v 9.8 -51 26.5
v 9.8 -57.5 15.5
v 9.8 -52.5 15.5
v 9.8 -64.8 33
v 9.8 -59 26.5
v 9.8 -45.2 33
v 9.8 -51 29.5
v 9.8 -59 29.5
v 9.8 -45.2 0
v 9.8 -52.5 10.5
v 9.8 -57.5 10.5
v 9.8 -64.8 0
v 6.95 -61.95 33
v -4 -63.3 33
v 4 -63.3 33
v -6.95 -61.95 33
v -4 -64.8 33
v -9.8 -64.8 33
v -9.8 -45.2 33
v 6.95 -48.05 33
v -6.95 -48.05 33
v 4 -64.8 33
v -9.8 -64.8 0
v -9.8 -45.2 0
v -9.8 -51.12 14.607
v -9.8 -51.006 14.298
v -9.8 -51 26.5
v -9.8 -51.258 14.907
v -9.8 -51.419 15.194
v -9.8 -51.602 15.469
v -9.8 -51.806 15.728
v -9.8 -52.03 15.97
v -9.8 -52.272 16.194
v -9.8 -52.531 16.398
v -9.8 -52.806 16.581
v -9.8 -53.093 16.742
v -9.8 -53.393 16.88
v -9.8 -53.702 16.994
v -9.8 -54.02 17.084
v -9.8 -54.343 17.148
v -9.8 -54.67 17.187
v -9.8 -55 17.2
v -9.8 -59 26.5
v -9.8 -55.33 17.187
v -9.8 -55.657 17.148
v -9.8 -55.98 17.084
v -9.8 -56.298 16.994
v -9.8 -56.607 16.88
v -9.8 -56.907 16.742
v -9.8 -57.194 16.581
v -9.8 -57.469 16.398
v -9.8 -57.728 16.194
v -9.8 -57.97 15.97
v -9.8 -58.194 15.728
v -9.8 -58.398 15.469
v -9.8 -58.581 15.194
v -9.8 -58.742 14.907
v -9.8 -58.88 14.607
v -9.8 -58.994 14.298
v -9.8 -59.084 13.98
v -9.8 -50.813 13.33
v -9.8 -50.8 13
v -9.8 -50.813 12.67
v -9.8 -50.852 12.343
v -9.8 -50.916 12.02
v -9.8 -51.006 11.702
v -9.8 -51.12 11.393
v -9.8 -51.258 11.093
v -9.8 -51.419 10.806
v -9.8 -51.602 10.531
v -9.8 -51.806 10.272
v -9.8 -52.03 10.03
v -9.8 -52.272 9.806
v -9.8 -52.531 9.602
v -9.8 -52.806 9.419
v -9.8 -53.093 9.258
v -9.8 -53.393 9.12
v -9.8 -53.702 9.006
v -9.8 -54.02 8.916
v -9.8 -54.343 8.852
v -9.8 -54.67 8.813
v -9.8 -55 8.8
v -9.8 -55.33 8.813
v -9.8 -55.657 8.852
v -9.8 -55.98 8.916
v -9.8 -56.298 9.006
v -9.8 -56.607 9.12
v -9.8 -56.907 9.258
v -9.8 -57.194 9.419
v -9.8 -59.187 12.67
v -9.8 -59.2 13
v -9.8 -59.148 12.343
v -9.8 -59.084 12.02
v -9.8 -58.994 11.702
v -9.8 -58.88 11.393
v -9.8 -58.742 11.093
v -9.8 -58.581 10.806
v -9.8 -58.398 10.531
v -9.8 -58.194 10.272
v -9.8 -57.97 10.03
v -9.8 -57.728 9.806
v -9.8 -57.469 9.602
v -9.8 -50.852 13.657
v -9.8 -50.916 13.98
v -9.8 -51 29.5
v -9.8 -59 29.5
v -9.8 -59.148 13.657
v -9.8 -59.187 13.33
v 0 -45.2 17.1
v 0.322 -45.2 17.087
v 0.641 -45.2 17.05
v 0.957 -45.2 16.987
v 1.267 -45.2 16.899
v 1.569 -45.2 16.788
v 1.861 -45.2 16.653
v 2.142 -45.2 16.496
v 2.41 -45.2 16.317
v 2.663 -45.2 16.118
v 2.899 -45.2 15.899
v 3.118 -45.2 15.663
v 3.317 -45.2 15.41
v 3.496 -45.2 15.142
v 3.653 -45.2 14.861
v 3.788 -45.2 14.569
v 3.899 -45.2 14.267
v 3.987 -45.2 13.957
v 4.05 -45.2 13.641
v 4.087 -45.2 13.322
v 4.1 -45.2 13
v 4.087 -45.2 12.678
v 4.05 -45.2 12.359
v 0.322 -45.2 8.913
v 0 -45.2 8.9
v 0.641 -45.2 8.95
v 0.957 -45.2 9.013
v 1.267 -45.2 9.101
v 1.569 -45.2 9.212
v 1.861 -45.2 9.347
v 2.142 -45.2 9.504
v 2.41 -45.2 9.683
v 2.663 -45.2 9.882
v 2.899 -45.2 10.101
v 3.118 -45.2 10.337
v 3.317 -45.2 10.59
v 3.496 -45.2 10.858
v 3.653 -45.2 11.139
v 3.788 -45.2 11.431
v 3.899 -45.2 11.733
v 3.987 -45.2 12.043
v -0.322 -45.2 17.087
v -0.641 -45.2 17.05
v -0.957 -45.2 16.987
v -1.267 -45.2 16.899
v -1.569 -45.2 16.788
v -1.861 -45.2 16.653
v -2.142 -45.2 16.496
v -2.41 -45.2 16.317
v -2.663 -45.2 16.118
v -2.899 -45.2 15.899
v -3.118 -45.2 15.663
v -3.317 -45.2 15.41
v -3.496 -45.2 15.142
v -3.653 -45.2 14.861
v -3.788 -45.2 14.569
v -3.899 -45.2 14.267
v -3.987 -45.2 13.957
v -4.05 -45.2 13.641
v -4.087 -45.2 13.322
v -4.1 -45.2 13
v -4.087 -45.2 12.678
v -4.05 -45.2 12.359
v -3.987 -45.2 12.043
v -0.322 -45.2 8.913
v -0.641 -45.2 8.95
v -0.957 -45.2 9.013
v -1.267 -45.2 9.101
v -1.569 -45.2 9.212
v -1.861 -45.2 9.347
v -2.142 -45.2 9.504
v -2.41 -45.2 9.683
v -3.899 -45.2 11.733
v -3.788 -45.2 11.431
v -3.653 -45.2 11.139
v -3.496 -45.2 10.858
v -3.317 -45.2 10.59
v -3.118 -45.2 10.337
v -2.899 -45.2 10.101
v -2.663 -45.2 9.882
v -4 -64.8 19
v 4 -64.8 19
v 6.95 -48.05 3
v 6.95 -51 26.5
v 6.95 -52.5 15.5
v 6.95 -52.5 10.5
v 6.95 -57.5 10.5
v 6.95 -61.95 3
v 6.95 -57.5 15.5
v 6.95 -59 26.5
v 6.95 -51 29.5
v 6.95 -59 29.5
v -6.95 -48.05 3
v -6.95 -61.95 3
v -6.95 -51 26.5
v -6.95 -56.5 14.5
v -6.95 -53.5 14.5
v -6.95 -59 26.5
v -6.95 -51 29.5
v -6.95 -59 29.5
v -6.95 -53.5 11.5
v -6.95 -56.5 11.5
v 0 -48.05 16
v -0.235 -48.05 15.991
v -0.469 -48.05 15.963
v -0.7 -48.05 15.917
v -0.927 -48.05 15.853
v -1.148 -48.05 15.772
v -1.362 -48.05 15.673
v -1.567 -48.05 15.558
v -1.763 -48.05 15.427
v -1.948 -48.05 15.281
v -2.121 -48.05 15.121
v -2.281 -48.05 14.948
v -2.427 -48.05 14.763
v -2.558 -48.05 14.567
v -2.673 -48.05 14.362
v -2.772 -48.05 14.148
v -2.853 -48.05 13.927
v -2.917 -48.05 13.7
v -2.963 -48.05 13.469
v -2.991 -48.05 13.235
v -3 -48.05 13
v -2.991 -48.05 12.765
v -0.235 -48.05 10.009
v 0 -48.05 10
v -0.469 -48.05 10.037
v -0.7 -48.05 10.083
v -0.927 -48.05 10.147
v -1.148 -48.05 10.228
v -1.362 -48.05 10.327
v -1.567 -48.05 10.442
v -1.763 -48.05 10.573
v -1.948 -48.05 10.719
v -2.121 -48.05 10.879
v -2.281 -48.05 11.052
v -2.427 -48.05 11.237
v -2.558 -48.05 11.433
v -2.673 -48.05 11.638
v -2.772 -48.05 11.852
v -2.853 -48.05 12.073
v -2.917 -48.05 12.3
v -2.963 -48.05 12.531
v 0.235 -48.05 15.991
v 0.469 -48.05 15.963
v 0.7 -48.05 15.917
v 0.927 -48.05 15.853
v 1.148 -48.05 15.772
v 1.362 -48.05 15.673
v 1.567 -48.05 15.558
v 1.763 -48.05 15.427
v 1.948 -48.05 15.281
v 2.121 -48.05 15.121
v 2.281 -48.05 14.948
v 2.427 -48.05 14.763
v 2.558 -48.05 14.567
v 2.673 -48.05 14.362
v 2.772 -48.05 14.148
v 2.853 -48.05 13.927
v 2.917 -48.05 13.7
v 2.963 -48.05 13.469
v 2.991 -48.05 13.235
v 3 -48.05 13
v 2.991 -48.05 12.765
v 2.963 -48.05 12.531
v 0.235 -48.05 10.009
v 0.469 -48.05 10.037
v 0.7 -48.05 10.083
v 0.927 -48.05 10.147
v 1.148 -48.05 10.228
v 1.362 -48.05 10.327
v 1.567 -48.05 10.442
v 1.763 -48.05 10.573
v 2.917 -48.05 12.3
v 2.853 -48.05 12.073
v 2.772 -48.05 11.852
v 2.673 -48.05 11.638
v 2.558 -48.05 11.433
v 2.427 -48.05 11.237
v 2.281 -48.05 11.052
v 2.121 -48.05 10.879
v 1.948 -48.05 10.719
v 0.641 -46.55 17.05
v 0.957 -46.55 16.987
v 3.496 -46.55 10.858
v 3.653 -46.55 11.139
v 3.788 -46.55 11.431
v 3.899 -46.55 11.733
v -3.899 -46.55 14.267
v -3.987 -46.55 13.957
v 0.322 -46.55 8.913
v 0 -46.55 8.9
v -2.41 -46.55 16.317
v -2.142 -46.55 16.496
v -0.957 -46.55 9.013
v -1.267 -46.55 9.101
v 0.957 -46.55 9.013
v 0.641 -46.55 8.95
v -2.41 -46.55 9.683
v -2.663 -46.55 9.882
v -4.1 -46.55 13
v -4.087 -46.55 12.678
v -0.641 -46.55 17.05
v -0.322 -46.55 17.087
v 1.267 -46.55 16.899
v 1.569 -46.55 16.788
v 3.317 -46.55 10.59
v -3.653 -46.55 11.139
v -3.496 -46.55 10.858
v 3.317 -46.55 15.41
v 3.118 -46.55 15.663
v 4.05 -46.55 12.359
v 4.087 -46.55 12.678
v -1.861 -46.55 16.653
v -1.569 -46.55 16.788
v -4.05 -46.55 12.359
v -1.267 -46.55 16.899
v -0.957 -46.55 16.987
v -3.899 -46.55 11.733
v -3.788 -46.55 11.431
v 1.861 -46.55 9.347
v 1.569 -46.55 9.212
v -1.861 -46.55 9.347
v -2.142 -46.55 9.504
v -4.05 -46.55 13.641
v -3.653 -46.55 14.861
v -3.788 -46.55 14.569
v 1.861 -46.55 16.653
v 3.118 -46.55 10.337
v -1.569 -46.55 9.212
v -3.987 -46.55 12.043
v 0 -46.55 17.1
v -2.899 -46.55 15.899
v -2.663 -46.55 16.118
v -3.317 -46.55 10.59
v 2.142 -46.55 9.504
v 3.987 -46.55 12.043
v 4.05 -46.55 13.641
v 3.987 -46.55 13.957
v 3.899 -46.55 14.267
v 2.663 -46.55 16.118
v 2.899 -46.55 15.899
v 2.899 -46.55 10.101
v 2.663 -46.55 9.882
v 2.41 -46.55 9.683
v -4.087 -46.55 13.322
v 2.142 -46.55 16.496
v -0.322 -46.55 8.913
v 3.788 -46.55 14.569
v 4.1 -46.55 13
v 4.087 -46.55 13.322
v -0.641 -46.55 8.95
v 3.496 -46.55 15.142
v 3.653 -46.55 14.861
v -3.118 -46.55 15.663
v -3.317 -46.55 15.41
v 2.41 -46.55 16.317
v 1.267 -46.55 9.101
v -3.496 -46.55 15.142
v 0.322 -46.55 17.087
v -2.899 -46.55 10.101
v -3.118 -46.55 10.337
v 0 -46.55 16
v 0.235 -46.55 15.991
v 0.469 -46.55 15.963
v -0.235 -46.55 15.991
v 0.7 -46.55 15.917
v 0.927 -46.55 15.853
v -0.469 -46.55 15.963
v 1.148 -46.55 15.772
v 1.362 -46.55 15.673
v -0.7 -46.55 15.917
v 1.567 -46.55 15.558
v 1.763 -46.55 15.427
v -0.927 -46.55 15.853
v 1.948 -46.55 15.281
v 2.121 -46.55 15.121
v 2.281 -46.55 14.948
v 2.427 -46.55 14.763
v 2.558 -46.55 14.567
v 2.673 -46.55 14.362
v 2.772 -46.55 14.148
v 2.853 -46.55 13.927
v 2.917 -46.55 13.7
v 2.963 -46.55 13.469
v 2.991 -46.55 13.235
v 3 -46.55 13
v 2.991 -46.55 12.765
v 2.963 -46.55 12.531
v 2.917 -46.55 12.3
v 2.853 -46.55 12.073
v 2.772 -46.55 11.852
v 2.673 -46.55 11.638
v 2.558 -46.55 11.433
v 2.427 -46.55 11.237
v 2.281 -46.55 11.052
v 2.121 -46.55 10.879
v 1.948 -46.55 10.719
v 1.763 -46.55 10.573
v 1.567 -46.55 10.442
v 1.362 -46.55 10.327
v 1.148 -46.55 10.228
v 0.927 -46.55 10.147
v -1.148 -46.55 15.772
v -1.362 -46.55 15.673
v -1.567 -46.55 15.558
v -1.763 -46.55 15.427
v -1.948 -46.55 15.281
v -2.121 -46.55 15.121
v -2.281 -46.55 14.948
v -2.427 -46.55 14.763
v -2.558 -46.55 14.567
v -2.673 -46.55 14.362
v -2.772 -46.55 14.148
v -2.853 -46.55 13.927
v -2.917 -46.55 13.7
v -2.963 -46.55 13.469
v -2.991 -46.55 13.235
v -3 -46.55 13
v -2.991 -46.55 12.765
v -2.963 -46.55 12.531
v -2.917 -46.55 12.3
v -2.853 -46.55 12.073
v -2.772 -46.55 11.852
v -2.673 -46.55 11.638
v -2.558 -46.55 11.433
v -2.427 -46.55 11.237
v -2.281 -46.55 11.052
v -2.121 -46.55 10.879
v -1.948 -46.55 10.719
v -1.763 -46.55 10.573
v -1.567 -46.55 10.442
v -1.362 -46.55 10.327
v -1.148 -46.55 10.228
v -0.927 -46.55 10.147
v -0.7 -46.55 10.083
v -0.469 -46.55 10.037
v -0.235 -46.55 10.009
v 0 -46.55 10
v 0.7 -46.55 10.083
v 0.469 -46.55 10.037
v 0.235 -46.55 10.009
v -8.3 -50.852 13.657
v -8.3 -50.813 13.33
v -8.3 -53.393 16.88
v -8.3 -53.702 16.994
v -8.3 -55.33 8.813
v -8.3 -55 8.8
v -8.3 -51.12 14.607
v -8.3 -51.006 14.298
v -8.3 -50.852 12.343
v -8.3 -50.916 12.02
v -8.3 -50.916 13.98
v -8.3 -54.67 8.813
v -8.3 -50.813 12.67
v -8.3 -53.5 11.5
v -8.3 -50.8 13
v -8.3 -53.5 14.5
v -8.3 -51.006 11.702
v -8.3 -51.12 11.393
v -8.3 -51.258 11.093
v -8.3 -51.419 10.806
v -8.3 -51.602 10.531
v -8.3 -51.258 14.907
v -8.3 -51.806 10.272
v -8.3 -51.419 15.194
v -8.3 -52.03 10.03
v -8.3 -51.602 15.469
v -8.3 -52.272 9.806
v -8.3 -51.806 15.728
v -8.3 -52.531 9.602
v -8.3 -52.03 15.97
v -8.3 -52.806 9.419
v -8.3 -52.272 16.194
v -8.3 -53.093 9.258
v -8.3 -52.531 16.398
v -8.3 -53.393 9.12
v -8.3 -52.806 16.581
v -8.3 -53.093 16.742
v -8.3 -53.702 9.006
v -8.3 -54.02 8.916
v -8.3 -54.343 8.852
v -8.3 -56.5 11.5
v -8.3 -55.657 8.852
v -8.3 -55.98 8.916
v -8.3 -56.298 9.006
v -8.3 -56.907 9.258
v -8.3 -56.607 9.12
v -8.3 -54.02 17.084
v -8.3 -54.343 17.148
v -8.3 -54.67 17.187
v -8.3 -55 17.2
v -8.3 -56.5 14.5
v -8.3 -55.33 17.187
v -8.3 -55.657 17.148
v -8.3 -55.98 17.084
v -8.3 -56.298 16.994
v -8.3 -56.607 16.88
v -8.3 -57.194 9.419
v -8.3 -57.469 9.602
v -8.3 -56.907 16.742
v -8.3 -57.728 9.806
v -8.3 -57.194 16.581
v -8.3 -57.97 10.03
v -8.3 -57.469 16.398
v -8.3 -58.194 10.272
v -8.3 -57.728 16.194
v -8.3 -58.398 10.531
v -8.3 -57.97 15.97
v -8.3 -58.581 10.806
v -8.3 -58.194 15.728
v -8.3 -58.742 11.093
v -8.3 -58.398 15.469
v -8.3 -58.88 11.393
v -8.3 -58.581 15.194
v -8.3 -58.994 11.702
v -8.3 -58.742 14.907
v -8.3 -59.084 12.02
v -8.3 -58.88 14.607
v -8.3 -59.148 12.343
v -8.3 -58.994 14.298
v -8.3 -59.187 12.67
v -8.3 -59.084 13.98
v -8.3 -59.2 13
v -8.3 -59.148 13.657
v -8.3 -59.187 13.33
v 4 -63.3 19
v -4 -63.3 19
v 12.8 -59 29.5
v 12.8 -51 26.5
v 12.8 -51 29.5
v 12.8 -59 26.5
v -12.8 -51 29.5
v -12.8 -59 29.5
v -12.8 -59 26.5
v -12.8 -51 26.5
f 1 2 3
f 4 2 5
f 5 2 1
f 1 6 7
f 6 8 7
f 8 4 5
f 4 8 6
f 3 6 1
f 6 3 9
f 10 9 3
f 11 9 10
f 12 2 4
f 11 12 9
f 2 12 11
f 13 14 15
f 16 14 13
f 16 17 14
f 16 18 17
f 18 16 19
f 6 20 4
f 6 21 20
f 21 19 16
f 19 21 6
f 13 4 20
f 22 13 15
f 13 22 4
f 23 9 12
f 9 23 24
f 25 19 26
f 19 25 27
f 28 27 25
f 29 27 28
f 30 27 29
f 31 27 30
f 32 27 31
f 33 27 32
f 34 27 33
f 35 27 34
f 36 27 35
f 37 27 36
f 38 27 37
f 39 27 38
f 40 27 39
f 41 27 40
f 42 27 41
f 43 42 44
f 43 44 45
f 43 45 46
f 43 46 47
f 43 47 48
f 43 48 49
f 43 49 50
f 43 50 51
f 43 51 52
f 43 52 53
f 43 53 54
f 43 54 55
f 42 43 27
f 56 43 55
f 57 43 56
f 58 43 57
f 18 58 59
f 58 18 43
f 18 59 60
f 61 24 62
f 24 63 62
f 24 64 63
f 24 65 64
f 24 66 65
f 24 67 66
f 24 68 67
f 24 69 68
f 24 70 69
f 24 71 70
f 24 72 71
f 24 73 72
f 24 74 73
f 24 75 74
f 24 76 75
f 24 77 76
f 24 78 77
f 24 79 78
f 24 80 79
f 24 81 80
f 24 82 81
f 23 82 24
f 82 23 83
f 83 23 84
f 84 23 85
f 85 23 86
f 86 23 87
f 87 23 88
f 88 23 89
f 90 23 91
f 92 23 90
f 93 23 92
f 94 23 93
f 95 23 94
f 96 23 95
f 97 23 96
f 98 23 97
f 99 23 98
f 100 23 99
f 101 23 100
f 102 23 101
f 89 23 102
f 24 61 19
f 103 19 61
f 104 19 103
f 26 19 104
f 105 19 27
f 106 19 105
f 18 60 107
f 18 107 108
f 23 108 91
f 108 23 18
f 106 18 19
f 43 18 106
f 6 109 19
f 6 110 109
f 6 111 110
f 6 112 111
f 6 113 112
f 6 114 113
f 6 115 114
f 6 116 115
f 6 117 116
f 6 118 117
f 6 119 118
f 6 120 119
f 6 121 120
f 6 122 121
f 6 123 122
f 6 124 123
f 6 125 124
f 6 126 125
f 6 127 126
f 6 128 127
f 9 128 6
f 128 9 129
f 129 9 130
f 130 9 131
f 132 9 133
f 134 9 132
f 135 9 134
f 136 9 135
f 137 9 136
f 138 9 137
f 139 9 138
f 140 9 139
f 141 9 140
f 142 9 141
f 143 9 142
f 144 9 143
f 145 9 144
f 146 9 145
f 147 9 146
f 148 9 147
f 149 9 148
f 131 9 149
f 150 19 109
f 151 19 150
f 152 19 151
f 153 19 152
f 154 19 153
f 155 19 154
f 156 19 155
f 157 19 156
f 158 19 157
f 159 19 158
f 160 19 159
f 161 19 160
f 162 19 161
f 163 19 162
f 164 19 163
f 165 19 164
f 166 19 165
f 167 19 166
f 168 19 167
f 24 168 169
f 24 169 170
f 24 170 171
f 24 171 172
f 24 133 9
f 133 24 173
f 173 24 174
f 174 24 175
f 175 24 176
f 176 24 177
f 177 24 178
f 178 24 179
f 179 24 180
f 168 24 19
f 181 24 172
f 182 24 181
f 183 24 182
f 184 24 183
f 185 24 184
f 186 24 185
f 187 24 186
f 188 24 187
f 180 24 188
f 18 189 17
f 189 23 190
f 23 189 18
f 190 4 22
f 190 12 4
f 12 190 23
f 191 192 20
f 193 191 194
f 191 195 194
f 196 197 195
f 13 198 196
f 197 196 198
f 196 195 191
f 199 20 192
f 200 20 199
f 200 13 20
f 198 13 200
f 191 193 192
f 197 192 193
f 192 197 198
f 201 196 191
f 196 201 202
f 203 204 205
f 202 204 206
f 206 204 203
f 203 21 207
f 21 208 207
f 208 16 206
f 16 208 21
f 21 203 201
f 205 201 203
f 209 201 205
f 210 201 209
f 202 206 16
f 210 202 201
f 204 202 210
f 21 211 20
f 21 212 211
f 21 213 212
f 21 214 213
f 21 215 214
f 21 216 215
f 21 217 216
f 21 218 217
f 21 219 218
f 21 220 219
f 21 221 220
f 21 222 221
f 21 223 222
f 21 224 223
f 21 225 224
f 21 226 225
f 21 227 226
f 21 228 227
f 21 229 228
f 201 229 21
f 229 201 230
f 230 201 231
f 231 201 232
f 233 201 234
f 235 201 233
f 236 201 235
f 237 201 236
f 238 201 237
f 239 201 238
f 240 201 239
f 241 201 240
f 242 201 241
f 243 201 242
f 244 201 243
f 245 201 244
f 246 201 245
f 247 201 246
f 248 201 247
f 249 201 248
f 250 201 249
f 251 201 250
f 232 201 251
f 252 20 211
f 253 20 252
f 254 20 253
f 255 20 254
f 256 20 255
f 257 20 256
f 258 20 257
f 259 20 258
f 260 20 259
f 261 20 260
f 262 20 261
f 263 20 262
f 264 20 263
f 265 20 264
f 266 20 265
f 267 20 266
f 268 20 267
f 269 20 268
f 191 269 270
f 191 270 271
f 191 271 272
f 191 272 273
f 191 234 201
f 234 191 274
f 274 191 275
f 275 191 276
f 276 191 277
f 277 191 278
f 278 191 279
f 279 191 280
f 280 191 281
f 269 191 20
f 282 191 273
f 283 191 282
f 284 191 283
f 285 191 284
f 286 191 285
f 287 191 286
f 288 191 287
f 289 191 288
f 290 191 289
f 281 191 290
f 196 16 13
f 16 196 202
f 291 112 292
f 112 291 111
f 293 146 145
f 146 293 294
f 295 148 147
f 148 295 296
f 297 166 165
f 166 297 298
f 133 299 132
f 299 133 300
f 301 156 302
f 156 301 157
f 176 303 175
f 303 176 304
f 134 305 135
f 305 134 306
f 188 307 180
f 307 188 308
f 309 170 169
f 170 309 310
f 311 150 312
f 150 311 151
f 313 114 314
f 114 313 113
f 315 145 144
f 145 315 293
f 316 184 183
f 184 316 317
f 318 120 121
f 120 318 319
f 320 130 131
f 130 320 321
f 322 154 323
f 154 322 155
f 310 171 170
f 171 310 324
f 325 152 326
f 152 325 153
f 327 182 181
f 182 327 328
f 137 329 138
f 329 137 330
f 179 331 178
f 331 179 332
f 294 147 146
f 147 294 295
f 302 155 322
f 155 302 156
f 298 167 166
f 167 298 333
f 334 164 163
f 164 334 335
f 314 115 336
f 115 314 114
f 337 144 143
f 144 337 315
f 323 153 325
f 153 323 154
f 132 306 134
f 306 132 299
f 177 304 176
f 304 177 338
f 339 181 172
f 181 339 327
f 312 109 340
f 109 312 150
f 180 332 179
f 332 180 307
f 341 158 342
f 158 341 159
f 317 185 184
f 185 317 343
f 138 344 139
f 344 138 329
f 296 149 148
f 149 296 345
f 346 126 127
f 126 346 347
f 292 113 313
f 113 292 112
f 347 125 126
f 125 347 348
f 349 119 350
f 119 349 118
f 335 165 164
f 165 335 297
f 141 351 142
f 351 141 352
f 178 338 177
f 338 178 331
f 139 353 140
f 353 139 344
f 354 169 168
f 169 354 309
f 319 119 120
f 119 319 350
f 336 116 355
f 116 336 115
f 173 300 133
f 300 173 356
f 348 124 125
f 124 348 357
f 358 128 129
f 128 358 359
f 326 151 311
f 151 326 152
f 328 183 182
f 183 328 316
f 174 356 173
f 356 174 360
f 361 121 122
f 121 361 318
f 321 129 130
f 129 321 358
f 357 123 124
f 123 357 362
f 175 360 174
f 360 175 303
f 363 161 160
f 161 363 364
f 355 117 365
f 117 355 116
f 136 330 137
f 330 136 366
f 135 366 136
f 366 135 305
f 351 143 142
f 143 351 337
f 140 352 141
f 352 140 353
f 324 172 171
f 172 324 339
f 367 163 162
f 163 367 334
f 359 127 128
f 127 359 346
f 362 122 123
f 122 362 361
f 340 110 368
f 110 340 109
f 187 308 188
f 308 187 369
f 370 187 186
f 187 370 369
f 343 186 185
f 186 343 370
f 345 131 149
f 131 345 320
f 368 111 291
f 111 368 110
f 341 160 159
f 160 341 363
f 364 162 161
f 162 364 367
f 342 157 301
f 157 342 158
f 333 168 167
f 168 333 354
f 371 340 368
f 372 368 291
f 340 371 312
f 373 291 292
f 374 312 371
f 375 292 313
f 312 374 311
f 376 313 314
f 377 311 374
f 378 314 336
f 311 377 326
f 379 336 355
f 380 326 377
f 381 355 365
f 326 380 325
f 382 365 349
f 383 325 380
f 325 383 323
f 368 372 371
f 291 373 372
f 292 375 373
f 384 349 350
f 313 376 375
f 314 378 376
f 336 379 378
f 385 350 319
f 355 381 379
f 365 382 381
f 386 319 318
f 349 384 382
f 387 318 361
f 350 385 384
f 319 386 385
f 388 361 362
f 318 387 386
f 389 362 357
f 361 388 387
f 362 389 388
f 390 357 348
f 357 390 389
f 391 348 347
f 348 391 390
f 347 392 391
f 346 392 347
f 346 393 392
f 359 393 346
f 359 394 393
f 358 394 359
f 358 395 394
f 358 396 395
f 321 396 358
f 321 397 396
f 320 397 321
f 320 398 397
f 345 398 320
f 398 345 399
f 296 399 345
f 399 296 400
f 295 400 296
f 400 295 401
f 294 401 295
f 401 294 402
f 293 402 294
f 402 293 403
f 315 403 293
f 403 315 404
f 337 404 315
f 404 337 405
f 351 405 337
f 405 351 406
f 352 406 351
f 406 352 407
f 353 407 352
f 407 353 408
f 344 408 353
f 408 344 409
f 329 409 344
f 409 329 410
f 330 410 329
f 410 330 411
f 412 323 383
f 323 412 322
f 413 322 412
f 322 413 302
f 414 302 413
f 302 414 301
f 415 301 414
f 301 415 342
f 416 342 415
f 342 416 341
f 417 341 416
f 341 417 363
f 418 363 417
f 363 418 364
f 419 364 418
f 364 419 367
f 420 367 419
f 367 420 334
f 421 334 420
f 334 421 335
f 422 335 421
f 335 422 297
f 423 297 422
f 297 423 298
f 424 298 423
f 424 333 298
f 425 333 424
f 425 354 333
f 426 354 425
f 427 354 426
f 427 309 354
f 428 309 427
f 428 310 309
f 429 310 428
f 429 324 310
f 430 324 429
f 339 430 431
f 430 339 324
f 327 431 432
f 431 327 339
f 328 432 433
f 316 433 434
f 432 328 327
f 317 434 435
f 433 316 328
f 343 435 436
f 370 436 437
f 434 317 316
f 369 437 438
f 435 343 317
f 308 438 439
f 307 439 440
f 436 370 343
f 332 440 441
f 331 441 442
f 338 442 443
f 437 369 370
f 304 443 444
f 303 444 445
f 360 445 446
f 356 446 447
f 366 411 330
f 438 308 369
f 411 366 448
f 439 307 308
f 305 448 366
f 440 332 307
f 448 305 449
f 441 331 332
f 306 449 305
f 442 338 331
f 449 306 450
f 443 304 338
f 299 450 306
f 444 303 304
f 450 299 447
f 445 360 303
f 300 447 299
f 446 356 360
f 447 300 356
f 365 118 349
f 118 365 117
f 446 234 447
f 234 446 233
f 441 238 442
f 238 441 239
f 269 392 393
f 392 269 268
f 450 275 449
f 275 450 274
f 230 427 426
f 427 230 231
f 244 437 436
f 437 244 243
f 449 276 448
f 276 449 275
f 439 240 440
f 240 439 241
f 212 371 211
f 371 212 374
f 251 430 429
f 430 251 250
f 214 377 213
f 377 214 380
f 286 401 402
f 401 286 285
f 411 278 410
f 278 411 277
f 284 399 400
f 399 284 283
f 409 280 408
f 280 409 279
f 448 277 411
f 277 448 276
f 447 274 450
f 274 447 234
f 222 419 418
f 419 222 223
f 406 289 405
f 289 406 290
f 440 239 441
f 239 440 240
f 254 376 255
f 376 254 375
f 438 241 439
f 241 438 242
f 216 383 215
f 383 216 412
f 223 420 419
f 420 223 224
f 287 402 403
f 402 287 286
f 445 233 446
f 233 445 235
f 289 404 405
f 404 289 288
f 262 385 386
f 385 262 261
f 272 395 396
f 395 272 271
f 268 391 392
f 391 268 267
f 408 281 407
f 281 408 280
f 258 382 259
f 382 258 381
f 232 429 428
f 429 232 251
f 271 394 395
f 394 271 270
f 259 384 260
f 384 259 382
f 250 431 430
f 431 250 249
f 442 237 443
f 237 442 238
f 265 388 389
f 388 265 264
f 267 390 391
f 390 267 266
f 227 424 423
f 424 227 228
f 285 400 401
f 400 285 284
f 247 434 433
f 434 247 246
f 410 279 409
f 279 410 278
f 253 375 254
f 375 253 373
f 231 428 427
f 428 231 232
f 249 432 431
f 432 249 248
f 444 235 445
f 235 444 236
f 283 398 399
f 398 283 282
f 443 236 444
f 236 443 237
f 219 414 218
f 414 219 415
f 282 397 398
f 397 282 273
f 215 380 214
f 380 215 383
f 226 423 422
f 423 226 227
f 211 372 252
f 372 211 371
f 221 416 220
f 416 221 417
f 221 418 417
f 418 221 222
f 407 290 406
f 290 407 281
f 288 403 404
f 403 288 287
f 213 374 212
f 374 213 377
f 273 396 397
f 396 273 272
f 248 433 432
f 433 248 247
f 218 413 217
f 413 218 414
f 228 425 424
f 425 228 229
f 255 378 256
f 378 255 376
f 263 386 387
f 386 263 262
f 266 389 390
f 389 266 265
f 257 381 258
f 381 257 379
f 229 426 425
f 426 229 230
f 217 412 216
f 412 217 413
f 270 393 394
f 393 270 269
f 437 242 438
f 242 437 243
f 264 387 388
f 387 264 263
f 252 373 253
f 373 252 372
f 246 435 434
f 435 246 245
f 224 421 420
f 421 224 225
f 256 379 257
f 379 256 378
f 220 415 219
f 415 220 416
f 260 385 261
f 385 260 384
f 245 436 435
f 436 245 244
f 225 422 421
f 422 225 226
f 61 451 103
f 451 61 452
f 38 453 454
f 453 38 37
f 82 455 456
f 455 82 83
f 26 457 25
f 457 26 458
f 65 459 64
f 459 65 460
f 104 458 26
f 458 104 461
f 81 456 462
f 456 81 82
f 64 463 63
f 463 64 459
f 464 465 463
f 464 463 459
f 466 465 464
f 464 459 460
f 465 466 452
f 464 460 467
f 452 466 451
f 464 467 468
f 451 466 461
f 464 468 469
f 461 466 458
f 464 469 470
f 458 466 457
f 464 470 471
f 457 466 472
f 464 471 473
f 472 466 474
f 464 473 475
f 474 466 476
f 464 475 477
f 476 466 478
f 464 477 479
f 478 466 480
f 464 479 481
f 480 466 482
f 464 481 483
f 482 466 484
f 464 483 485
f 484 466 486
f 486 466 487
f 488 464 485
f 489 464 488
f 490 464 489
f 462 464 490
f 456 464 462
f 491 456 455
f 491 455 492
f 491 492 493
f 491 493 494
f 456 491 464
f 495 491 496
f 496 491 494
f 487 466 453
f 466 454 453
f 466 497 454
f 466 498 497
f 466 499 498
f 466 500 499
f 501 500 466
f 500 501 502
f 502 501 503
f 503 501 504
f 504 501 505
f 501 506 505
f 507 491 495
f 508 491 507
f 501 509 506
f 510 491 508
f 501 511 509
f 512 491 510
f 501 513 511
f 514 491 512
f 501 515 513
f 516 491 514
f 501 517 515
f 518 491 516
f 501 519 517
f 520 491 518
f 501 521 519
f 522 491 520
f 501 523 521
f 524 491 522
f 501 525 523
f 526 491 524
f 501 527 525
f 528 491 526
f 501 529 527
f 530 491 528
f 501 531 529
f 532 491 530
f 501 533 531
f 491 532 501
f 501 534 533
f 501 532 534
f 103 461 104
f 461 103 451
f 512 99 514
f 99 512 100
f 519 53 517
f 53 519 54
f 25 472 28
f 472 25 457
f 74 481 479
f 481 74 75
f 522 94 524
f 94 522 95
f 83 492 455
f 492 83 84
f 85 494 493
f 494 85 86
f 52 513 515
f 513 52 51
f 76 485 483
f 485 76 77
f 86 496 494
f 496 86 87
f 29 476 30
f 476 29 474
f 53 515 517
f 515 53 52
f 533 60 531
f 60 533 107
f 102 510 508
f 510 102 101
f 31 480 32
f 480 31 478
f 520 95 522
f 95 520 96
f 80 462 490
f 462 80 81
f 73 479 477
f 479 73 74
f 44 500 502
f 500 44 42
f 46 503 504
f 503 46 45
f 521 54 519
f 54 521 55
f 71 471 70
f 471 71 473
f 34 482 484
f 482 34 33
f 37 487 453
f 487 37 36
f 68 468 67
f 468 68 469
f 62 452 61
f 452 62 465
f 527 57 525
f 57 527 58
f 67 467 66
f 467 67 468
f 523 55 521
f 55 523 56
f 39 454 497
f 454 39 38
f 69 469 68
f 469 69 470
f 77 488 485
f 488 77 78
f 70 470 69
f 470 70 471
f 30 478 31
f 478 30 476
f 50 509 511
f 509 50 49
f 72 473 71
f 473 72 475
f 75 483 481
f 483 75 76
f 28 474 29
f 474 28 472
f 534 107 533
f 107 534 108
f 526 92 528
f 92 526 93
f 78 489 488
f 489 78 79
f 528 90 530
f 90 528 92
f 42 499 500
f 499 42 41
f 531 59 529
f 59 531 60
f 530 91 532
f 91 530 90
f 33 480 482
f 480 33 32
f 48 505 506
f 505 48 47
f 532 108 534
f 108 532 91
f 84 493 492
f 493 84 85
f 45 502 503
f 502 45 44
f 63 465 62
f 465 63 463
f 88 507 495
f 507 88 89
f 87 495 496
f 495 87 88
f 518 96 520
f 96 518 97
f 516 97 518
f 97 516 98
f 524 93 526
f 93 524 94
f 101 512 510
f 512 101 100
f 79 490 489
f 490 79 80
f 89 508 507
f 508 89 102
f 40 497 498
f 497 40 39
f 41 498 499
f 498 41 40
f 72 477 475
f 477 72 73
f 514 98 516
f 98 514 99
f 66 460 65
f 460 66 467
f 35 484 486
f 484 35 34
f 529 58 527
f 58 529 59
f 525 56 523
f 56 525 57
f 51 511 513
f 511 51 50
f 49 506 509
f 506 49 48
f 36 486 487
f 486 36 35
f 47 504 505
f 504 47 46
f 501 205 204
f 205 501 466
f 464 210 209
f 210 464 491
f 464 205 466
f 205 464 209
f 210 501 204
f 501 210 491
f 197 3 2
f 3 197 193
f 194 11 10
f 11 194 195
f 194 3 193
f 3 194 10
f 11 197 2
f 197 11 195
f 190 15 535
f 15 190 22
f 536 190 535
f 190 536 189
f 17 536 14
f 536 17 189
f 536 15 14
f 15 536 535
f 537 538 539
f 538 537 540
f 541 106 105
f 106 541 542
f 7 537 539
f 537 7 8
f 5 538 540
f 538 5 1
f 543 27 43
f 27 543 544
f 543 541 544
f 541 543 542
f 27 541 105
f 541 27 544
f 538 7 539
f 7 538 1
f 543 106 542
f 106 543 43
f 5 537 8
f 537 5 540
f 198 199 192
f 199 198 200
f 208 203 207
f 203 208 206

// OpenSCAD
// Magnetic OD meter
// Version 5: May 2018, Leon Abelmann
// Differences with version 4 of Hans Keizer
// - Made top lid longer, to accomodate cuvettes with plug
// - Made the insert 0.3 mm bigger to 12.3, so that cuvettes slide in more easily

$vpd=400; //Viewport, defines the zoom factor after auto reload
$fn=80; //High res
//$fn = 20; //Low res for testing

T = 3; //wall thickness in mm
depth_coil=5;

coil_w = 10;
coil_h = 5;
coil_r = 21;
coil_r1 = 22+9-depth_coil;
coil_r2 = 8;
hole_r = 0;
coil_spacing = 23.1;
//coil_spacing = 72;

play = 0.2;
play_cuvette = 0.3;

Wcuv = 13.6; //cuvette width
Hcuv = 30; //cuvette holder height

//translate([-50,0,0]) rotate([180,0,0]) rotate([0,-90,0]) coil_holder();
//translate([0,80,0]) rotate([0,90,-90]) cam_tube_holder();

// Generate entire design
/* translate([0,0.0])     frame(); */
/* translate([50,0,0])    led_holder(); */
/* rotate([0,180,0]) translate([0,0,-coil_spacing]) top_coil()  ; //top coil (with lid hole) */
/* rotate([0,0,0]) translate([0,0,-coil_spacing])  coil(); //bottom coil */
/* rotate([0,90,0]) translate([0,0,-coil_spacing])  coil();  //PD coil */
/* rotate([90,90,0]) translate([0,0,-coil_spacing])  coil();  //camera coil */
/* rotate([-90,-90,0]) translate([0,0,-coil_spacing])  coil(); //non-camera coil */
/* translate([0,0,-10-T]) cuvette_tube(); */
/* translate([0,0,60])    top_lid(); */

// Individual components in one field
//translate ([0,0,36]) frame();
//translate([0,65,15]) rotate([0,90,0]) led_holder();
//translate([45,-50,15]) top_coil();
//translate([-65,-65,15]) coil(); //need 4 of those
//translate([-65,-10,15]) coil();
//translate([-65,45,15]) coil();
//translate([-65,100,15]) coil();
translate([0,-55,0]) cuvette_tube();
//translate ([56,0,0]) rotate([180,0,0]) top_lid(); // need 2 of those
//translate ([56,40,0]) rotate([180,0,0]) top_lid(); // need 2 of those


// frame (center part)
module frame(){
     difference(){
	  union(){
	       frame_len = 72;
	       difference(){
		    coil_frame(frame_len);
		    //cut out cuvette
		    translate([0,0,-10-T]) cuvette_cube();
		    //cut out holes
		    holeD = 0.9;
		    hole_spacing = 23.1;
		    //cut out space for:
		    //bottom coil
		    rotate([0,0,0])
			 translate([0,0,-hole_spacing])
			 coil_holes(coil_w, coil_h, coil_r, hole_r, holeD);
		    //top coil with lid hole
		    rotate([0,180,0])
			 translate([0,0,-hole_spacing])
			 coil_holes(coil_w, coil_h, coil_r, coil_r-2*T, holeD);
		    //PD coil
		    rotate([0,90,0])
			 translate([0,0,-hole_spacing])
			 coil_holes(coil_w, coil_h, coil_r, hole_r, holeD);
		    //LED coil
		    rotate([0,-90,0])
			 translate([0,0,-hole_spacing])
			 coil_holes(coil_w, coil_h, coil_r, coil_r-2*T, holeD);
		    //camera coil
		    rotate([90,90,0])
			 translate([0,0,-hole_spacing])
			 coil_holes(coil_w, coil_h, coil_r, coil_r-2*T, holeD);
		    //non-camera coil
		    rotate([-90,-90,0])
			 translate([0,0,-hole_spacing])
			 coil_holes(coil_w, coil_h, coil_r, hole_r, holeD); 
	       }          
	  }
	  //cut out camera hole
	  translate([-2, 10, 0])
	       cube([1.5*Wcuv, 20, 1.75*Wcuv], center=true);
	  //cut out camera hole other side
	  translate([-2, -10, 0])
	       cube([1.5*Wcuv, 20, 1.75*Wcuv], center=true);
     }
}//End frame

// Coil with led holder
module led_holder(){
     union(){
	  rotate([0,-90,0])
	       translate([0,0,coil_spacing+0.5*coil_r-2*T])
	       coil_spindle(coil_w, coil_h, coil_r, coil_r-2*T); //LED coil
	  //add LED holder
	  LEDtube_L = 30;
	  translate([LEDtube_L/2+frame_len/2-T,0,0])
	       rotate([0,90,0])
	       union(){
	       //create extension tube        
	       cylinder_hollow(LEDtube_L, coil_r-2*T, coil_r-3*T, true);
	       LED_d = 5;
	       difference(){
                    //lid of extension tube
                    translate([0, 0, LEDtube_L/2-T/2])
			 cylinder(h=T, r1=coil_r-2*T, r2=coil_r-2*T, center=true);
                    //hole for LED
                    translate([0, 0, LEDtube_L/2-T/2])
			 cylinder(h=T, d1=LED_d, d2=LED_d, center=true);
	       }
	  }
     }
}//end module ledholder

// Coil on top with opening for lid
module top_coil(){
     coil_spindle(coil_w, coil_h, coil_r, coil_r-2*T);
}

module top_lid(){
     top_lid_height = 15; //Increase to accommodate for cuvette with plug
     union(){
	  translate([0,0,0]) hex_hollow(8, T, coil_r-T, 0);
	  translate([0,0,-top_lid_height/2]) hex_hollow(8, top_lid_height, coil_r-2*T-play/2, coil_r-3*T-play/2);
     }
}

// Coil other coils without special treatment
module coil(){
     coil_spindle(coil_w, coil_h, coil_r, hole_r);
}

// Insert to accomodate diffent types of cuvettes
module cuvette_cube (  ) {
     translate([-Wcuv/2-T-play/2, -Wcuv/2-T-play/2, 0])
	  cube([Wcuv+2*T+play, Wcuv+2*T+play, Hcuv+T], center=false);
     
     //Add 'wings'
     //Wings need to be shorter!
     wing_h = 28;
     wing_l = 4;
     wing_w = 8;
     translate([0,0,wing_h]) 
	  cube([Wcuv+2*T+2*wing_l+play, wing_w+play, 2*T], center=true);   
}

// *************************** subunits *********************************
module coil_holder(){
     difference(){
	  polyN(8, T*2, coil_r-T);
	  holeD = 0.9;
	  translate([0,0,10])
	       coil_holes(coil_w, coil_h, coil_r, hole_r, holeD);
     }
     polyN = 7;
     polyH = 30;
     polyR = 3;
     translate([0,0,polyH/2+T/2])
	  polyNflat(polyN, polyH, polyR);
}

module coil_frame(frame_len){
     difference(){
	  union(){
	       //basic structure
	       difference(){
		    //outer structure
		    union(){
			 rotate([0,0,0])
			      polyN(8, frame_len, coil_r-T);
			 rotate([0,90,0])
			      polyN(8, frame_len, coil_r-T);
			 rotate([90,0,0])
			      polyN(8, frame_len, coil_r-T);
		    }
		    //free inner structure
		    union(){
			 rotate([0,0,0])
			      polyN(8, 1.1*(frame_len+shiftup), coil_r-2*T);
			 // 1.1 to make subtraction nicer
			 rotate([0,90,0])
			      polyN(8, 1.1*frame_len, coil_r-2*T); 
			 rotate([90,0,0])
			      polyN(8, 1.1*frame_len, coil_r-2*T);
		    }  
	       }  
	       
	       //create opening for cuvette holder
	       // This is not nice, the difference is not between two objects
	       // Should be rewritten, but is a lot of work
	       difference(){
	       	    rotate([0,90,0]) polyN(8, frame_len, coil_r-T);
	       	    rotate([0,90,0]) polyN(8, frame_len, coil_r-2*T);
	       	    translate([0,0,15])
	       		 cube(Wcuv, center=true);
	       };
	       //close one side of cuvette holder to accomdate light slit
	       translate([(Wcuv+T)/2,0,0])
	       	    rotate([0,90,0])
	       	    polyN(8,T,coil_r-1*T);
	  }
	  
	  //drill cable holes
	  hole_d = 3;
	  hole_h = T+2;
	  translate([-20,0,-coil_r+1.5*T])
	       cylinder(h=hole_h, d1=hole_d, d2=hole_d, center=true);
	  translate([20,0,-coil_r+1.5*T])
	       cylinder(h=hole_h, d1=hole_d, d2=hole_d, center=true);
	  translate([0,20,-coil_r+1.5*T])
	       cylinder(h=hole_h, d1=hole_d, d2=hole_d, center=true);
	  translate([0,-20,-coil_r+1.5*T])
	       cylinder(h=hole_h, d1=hole_d, d2=hole_d, center=true);
	  translate([0,-coil_r+1.5*T,20]) 
	       rotate([90,90,0])
	       cylinder(h=hole_h, d1=hole_d, d2=hole_d, center=true);
	  translate([0,-coil_r+1.5*T,-20]) 
	       rotate([90,90,0])
	       cylinder(h=hole_h, d1=hole_d, d2=hole_d, center=true);
     }
}

module coil_spindle(coil_w, coil_h, coil_r, hole_r){   
     translate([0,0,-coil_w/2-T])
	  union(){
	  //major cylinder
	  cylinder_hollow_hex(coil_w+2*T, coil_r, coil_r-T+play/2, true);
	  //tapered edge on one side
	  intersection(){
	       translate([0,0,coil_w/2+T/2])
	  	    cylinder_hollow(T, coil_r+coil_h, coil_r-T+play, true);
	       translate([0,0,coil_w/2+T/2])
	  	    cylinder(h=T, r1=coil_r+coil_h, r2 = coil_r+coil_h-T, center=true);
	  }
	  //holed edge on other side
	  difference(){
	       translate([0,0,-coil_w/2-T/2])
	  	    cylinder_hollow_hex(T, coil_r+coil_h, hole_r, true);
	       coil_holes(coil_w, coil_h, coil_r, hole_r, 1.2);
	  }
     }
}


module coil_holes(coil_w, coil_h, coil_r, hole_r, holeD){
     //screw holes
     hole_screwD = holeD;
     screwLen = 8;
     Nscrew = 4;
     thetaStep = 360/Nscrew;
     for(i=[0:Nscrew-1]){
	  r = coil_r-1.5*T;
	  rotate([0,0,i*thetaStep])
	       translate([r,0,-coil_w-T+screwLen/2])
	       cylinder(h=screwLen, d1=hole_screwD, d2=hole_screwD, center=true);
     }
     
     //screw holes for coil
     hole_screwD1 = holeD;
     screwLen1 = 8;
     Nscrew1 = 1;
     thetaStep1 = 360/Nscrew1;
     for(i=[0:Nscrew1-1]){
	  r = coil_r1-1.5*T;
	  rotate([0,0,i*thetaStep1])
	       translate([r,0,-coil_w-T+screwLen/2])
	       cylinder(h=screwLen1, d1=hole_screwD1, d2=hole_screwD1, center=true);
     }
     
     //screw holes for wiring
     hole_screwD2 = 6;
     screwLen2 = 8;
     Nscrew2 = 1;
     thetaStep2 = 360/Nscrew2;
     for(i=[0:Nscrew2-1]){
	  r = coil_r2-1.5*T;
	  rotate([0,0,i*thetaStep2])
	       translate([r,0,-coil_w-T+screwLen2/2])
	       cylinder(h=screwLen2, d1=hole_screwD2, d2=hole_screwD2, center=true);
     }     
}

module cylinder_hollow(height, radius_outer, radius_inner, cent){
     difference(){
	  cylinder(h=height, r1=radius_outer, r2=radius_outer, center=cent);
	  cylinder(h=1.1*height, r1=radius_inner, r2=radius_inner, center=cent);//1.1 to get cleaner difference
     }
}

module cylinder_hollow_hex(height, radius_outer, radius_inner, cent){
    difference(){
	 cylinder(h=height, r1=radius_outer, r2=radius_outer, center=cent);
	 polyN(8, 1.1*height, radius_inner);//1.1 for clean difference
    }
}

module hex_hollow(N, height, radius_outer, radius_inner){
     difference(){
	  polyN(N, height, radius_outer);
	  polyN(N, height, radius_inner);
     }
}

module cuvette_tube (  ) {
     difference(){
	  
        //Basic tube
	  translate([-Wcuv/2-T, -Wcuv/2-T, 0])
	       difference(){
	       cube([Wcuv+2*T, Wcuv+2*T, Hcuv+T], center=false);
	       translate([T-play_cuvette/2, T-play_cuvette/2, T]) cube([Wcuv+play_cuvette, Wcuv+play_cuvette, Hcuv+1], center=false);
	  }
	  
	  //Includes slits
	  slit_H = 10;                    //height of slits (w.r.t. cuvette)
	  slit2_H = 3;                 //secondary slit height
	  slit2_W = 3;                    //secondary slit width
	  slit2_dist = 3;                 //secondary slit spacing
	  slit3_W=4;                      //third slit width
	  slit3_H=4;                      //third slit height
	  slit1_H = 5;                    //primary slit height
	  slit1_W = 5;                    //primary slit width
	  radius_photo=4.1;               //radius of photodiode
	  radius_photo2=3;               //radius of photodiode
	  radius_photo3=4.2;               //radius of photodiode
	  slit_diff=slit2_H-slit1_H;
	  translate([0, 0, slit_H+T])
	       union(){
	       //Primary slit
	       translate([Wcuv/2+T/2, 0 ,0]) 
		    cube([T+1, slit1_W, slit1_H], center=true);
	       
	       //Scatter slit holder
	       union(){
		    translate([0, (Wcuv/2+1.55*T) ,0]) 
			 rotate([90,90,0])
			 cylinder(h=2*T, r1=radius_photo, r2=radius_photo, center=true);
		    //Scatter slit
		    translate([0, (Wcuv/2+1.5*T) ,0]) 
			 rotate([90,90,0])
			 cylinder(h=4*T, r1=radius_photo2, r2=radius_photo2, center=true);
	       }
	       
	       //Delete hall sensor
	       sensor_h = 30;
	       sensor_l = 8;
	       sensor_w = 8;
	       translate([0,-Wcuv/2-T/2-0.5*sensor_l,0.7*sensor_h]) 
		    cube([sensor_w, sensor_l, sensor_h], center=true);
	       
	       
	       //secondary slit
	       union(){
		    translate([-Wcuv/2-1.5*T,0, 0]) 
			 rotate([0,90,0])
			 cylinder(h=2*T, r1=radius_photo3, r2=radius_photo3, center=true);
		    translate([-Wcuv/2-T/2,0, slit1_H/2+slit_diff/2])
			 translate([0, 0, -slit2_dist/2])   cube([T+1, slit2_W, slit2_H], center=true);
	       }
	  }
     }
     
     //Add 'wings'
     wing_h = 28;
     wing_l = 3; 
     wing_w = 8;
     translate([0,0,wing_h]) 
	  difference(){
	  cube([Wcuv+2*T+2*wing_l, wing_w, T], center=true);
	  cube([Wcuv+play_cuvette, Wcuv+play_cuvette, T], center=true);
     }
}

module polyNflat(N, H, Rflat){
     polyR = Rflat/cos(180/N);
     linear_extrude(height=H, center=true, convexity=0, twist=0, slices=0) circle(polyR, $fn=N);
}

module polyN(N, H, R){
     linear_extrude(height=H, center=true, convexity=0, twist=0, slices=0) circle(R, $fn=N);
}
